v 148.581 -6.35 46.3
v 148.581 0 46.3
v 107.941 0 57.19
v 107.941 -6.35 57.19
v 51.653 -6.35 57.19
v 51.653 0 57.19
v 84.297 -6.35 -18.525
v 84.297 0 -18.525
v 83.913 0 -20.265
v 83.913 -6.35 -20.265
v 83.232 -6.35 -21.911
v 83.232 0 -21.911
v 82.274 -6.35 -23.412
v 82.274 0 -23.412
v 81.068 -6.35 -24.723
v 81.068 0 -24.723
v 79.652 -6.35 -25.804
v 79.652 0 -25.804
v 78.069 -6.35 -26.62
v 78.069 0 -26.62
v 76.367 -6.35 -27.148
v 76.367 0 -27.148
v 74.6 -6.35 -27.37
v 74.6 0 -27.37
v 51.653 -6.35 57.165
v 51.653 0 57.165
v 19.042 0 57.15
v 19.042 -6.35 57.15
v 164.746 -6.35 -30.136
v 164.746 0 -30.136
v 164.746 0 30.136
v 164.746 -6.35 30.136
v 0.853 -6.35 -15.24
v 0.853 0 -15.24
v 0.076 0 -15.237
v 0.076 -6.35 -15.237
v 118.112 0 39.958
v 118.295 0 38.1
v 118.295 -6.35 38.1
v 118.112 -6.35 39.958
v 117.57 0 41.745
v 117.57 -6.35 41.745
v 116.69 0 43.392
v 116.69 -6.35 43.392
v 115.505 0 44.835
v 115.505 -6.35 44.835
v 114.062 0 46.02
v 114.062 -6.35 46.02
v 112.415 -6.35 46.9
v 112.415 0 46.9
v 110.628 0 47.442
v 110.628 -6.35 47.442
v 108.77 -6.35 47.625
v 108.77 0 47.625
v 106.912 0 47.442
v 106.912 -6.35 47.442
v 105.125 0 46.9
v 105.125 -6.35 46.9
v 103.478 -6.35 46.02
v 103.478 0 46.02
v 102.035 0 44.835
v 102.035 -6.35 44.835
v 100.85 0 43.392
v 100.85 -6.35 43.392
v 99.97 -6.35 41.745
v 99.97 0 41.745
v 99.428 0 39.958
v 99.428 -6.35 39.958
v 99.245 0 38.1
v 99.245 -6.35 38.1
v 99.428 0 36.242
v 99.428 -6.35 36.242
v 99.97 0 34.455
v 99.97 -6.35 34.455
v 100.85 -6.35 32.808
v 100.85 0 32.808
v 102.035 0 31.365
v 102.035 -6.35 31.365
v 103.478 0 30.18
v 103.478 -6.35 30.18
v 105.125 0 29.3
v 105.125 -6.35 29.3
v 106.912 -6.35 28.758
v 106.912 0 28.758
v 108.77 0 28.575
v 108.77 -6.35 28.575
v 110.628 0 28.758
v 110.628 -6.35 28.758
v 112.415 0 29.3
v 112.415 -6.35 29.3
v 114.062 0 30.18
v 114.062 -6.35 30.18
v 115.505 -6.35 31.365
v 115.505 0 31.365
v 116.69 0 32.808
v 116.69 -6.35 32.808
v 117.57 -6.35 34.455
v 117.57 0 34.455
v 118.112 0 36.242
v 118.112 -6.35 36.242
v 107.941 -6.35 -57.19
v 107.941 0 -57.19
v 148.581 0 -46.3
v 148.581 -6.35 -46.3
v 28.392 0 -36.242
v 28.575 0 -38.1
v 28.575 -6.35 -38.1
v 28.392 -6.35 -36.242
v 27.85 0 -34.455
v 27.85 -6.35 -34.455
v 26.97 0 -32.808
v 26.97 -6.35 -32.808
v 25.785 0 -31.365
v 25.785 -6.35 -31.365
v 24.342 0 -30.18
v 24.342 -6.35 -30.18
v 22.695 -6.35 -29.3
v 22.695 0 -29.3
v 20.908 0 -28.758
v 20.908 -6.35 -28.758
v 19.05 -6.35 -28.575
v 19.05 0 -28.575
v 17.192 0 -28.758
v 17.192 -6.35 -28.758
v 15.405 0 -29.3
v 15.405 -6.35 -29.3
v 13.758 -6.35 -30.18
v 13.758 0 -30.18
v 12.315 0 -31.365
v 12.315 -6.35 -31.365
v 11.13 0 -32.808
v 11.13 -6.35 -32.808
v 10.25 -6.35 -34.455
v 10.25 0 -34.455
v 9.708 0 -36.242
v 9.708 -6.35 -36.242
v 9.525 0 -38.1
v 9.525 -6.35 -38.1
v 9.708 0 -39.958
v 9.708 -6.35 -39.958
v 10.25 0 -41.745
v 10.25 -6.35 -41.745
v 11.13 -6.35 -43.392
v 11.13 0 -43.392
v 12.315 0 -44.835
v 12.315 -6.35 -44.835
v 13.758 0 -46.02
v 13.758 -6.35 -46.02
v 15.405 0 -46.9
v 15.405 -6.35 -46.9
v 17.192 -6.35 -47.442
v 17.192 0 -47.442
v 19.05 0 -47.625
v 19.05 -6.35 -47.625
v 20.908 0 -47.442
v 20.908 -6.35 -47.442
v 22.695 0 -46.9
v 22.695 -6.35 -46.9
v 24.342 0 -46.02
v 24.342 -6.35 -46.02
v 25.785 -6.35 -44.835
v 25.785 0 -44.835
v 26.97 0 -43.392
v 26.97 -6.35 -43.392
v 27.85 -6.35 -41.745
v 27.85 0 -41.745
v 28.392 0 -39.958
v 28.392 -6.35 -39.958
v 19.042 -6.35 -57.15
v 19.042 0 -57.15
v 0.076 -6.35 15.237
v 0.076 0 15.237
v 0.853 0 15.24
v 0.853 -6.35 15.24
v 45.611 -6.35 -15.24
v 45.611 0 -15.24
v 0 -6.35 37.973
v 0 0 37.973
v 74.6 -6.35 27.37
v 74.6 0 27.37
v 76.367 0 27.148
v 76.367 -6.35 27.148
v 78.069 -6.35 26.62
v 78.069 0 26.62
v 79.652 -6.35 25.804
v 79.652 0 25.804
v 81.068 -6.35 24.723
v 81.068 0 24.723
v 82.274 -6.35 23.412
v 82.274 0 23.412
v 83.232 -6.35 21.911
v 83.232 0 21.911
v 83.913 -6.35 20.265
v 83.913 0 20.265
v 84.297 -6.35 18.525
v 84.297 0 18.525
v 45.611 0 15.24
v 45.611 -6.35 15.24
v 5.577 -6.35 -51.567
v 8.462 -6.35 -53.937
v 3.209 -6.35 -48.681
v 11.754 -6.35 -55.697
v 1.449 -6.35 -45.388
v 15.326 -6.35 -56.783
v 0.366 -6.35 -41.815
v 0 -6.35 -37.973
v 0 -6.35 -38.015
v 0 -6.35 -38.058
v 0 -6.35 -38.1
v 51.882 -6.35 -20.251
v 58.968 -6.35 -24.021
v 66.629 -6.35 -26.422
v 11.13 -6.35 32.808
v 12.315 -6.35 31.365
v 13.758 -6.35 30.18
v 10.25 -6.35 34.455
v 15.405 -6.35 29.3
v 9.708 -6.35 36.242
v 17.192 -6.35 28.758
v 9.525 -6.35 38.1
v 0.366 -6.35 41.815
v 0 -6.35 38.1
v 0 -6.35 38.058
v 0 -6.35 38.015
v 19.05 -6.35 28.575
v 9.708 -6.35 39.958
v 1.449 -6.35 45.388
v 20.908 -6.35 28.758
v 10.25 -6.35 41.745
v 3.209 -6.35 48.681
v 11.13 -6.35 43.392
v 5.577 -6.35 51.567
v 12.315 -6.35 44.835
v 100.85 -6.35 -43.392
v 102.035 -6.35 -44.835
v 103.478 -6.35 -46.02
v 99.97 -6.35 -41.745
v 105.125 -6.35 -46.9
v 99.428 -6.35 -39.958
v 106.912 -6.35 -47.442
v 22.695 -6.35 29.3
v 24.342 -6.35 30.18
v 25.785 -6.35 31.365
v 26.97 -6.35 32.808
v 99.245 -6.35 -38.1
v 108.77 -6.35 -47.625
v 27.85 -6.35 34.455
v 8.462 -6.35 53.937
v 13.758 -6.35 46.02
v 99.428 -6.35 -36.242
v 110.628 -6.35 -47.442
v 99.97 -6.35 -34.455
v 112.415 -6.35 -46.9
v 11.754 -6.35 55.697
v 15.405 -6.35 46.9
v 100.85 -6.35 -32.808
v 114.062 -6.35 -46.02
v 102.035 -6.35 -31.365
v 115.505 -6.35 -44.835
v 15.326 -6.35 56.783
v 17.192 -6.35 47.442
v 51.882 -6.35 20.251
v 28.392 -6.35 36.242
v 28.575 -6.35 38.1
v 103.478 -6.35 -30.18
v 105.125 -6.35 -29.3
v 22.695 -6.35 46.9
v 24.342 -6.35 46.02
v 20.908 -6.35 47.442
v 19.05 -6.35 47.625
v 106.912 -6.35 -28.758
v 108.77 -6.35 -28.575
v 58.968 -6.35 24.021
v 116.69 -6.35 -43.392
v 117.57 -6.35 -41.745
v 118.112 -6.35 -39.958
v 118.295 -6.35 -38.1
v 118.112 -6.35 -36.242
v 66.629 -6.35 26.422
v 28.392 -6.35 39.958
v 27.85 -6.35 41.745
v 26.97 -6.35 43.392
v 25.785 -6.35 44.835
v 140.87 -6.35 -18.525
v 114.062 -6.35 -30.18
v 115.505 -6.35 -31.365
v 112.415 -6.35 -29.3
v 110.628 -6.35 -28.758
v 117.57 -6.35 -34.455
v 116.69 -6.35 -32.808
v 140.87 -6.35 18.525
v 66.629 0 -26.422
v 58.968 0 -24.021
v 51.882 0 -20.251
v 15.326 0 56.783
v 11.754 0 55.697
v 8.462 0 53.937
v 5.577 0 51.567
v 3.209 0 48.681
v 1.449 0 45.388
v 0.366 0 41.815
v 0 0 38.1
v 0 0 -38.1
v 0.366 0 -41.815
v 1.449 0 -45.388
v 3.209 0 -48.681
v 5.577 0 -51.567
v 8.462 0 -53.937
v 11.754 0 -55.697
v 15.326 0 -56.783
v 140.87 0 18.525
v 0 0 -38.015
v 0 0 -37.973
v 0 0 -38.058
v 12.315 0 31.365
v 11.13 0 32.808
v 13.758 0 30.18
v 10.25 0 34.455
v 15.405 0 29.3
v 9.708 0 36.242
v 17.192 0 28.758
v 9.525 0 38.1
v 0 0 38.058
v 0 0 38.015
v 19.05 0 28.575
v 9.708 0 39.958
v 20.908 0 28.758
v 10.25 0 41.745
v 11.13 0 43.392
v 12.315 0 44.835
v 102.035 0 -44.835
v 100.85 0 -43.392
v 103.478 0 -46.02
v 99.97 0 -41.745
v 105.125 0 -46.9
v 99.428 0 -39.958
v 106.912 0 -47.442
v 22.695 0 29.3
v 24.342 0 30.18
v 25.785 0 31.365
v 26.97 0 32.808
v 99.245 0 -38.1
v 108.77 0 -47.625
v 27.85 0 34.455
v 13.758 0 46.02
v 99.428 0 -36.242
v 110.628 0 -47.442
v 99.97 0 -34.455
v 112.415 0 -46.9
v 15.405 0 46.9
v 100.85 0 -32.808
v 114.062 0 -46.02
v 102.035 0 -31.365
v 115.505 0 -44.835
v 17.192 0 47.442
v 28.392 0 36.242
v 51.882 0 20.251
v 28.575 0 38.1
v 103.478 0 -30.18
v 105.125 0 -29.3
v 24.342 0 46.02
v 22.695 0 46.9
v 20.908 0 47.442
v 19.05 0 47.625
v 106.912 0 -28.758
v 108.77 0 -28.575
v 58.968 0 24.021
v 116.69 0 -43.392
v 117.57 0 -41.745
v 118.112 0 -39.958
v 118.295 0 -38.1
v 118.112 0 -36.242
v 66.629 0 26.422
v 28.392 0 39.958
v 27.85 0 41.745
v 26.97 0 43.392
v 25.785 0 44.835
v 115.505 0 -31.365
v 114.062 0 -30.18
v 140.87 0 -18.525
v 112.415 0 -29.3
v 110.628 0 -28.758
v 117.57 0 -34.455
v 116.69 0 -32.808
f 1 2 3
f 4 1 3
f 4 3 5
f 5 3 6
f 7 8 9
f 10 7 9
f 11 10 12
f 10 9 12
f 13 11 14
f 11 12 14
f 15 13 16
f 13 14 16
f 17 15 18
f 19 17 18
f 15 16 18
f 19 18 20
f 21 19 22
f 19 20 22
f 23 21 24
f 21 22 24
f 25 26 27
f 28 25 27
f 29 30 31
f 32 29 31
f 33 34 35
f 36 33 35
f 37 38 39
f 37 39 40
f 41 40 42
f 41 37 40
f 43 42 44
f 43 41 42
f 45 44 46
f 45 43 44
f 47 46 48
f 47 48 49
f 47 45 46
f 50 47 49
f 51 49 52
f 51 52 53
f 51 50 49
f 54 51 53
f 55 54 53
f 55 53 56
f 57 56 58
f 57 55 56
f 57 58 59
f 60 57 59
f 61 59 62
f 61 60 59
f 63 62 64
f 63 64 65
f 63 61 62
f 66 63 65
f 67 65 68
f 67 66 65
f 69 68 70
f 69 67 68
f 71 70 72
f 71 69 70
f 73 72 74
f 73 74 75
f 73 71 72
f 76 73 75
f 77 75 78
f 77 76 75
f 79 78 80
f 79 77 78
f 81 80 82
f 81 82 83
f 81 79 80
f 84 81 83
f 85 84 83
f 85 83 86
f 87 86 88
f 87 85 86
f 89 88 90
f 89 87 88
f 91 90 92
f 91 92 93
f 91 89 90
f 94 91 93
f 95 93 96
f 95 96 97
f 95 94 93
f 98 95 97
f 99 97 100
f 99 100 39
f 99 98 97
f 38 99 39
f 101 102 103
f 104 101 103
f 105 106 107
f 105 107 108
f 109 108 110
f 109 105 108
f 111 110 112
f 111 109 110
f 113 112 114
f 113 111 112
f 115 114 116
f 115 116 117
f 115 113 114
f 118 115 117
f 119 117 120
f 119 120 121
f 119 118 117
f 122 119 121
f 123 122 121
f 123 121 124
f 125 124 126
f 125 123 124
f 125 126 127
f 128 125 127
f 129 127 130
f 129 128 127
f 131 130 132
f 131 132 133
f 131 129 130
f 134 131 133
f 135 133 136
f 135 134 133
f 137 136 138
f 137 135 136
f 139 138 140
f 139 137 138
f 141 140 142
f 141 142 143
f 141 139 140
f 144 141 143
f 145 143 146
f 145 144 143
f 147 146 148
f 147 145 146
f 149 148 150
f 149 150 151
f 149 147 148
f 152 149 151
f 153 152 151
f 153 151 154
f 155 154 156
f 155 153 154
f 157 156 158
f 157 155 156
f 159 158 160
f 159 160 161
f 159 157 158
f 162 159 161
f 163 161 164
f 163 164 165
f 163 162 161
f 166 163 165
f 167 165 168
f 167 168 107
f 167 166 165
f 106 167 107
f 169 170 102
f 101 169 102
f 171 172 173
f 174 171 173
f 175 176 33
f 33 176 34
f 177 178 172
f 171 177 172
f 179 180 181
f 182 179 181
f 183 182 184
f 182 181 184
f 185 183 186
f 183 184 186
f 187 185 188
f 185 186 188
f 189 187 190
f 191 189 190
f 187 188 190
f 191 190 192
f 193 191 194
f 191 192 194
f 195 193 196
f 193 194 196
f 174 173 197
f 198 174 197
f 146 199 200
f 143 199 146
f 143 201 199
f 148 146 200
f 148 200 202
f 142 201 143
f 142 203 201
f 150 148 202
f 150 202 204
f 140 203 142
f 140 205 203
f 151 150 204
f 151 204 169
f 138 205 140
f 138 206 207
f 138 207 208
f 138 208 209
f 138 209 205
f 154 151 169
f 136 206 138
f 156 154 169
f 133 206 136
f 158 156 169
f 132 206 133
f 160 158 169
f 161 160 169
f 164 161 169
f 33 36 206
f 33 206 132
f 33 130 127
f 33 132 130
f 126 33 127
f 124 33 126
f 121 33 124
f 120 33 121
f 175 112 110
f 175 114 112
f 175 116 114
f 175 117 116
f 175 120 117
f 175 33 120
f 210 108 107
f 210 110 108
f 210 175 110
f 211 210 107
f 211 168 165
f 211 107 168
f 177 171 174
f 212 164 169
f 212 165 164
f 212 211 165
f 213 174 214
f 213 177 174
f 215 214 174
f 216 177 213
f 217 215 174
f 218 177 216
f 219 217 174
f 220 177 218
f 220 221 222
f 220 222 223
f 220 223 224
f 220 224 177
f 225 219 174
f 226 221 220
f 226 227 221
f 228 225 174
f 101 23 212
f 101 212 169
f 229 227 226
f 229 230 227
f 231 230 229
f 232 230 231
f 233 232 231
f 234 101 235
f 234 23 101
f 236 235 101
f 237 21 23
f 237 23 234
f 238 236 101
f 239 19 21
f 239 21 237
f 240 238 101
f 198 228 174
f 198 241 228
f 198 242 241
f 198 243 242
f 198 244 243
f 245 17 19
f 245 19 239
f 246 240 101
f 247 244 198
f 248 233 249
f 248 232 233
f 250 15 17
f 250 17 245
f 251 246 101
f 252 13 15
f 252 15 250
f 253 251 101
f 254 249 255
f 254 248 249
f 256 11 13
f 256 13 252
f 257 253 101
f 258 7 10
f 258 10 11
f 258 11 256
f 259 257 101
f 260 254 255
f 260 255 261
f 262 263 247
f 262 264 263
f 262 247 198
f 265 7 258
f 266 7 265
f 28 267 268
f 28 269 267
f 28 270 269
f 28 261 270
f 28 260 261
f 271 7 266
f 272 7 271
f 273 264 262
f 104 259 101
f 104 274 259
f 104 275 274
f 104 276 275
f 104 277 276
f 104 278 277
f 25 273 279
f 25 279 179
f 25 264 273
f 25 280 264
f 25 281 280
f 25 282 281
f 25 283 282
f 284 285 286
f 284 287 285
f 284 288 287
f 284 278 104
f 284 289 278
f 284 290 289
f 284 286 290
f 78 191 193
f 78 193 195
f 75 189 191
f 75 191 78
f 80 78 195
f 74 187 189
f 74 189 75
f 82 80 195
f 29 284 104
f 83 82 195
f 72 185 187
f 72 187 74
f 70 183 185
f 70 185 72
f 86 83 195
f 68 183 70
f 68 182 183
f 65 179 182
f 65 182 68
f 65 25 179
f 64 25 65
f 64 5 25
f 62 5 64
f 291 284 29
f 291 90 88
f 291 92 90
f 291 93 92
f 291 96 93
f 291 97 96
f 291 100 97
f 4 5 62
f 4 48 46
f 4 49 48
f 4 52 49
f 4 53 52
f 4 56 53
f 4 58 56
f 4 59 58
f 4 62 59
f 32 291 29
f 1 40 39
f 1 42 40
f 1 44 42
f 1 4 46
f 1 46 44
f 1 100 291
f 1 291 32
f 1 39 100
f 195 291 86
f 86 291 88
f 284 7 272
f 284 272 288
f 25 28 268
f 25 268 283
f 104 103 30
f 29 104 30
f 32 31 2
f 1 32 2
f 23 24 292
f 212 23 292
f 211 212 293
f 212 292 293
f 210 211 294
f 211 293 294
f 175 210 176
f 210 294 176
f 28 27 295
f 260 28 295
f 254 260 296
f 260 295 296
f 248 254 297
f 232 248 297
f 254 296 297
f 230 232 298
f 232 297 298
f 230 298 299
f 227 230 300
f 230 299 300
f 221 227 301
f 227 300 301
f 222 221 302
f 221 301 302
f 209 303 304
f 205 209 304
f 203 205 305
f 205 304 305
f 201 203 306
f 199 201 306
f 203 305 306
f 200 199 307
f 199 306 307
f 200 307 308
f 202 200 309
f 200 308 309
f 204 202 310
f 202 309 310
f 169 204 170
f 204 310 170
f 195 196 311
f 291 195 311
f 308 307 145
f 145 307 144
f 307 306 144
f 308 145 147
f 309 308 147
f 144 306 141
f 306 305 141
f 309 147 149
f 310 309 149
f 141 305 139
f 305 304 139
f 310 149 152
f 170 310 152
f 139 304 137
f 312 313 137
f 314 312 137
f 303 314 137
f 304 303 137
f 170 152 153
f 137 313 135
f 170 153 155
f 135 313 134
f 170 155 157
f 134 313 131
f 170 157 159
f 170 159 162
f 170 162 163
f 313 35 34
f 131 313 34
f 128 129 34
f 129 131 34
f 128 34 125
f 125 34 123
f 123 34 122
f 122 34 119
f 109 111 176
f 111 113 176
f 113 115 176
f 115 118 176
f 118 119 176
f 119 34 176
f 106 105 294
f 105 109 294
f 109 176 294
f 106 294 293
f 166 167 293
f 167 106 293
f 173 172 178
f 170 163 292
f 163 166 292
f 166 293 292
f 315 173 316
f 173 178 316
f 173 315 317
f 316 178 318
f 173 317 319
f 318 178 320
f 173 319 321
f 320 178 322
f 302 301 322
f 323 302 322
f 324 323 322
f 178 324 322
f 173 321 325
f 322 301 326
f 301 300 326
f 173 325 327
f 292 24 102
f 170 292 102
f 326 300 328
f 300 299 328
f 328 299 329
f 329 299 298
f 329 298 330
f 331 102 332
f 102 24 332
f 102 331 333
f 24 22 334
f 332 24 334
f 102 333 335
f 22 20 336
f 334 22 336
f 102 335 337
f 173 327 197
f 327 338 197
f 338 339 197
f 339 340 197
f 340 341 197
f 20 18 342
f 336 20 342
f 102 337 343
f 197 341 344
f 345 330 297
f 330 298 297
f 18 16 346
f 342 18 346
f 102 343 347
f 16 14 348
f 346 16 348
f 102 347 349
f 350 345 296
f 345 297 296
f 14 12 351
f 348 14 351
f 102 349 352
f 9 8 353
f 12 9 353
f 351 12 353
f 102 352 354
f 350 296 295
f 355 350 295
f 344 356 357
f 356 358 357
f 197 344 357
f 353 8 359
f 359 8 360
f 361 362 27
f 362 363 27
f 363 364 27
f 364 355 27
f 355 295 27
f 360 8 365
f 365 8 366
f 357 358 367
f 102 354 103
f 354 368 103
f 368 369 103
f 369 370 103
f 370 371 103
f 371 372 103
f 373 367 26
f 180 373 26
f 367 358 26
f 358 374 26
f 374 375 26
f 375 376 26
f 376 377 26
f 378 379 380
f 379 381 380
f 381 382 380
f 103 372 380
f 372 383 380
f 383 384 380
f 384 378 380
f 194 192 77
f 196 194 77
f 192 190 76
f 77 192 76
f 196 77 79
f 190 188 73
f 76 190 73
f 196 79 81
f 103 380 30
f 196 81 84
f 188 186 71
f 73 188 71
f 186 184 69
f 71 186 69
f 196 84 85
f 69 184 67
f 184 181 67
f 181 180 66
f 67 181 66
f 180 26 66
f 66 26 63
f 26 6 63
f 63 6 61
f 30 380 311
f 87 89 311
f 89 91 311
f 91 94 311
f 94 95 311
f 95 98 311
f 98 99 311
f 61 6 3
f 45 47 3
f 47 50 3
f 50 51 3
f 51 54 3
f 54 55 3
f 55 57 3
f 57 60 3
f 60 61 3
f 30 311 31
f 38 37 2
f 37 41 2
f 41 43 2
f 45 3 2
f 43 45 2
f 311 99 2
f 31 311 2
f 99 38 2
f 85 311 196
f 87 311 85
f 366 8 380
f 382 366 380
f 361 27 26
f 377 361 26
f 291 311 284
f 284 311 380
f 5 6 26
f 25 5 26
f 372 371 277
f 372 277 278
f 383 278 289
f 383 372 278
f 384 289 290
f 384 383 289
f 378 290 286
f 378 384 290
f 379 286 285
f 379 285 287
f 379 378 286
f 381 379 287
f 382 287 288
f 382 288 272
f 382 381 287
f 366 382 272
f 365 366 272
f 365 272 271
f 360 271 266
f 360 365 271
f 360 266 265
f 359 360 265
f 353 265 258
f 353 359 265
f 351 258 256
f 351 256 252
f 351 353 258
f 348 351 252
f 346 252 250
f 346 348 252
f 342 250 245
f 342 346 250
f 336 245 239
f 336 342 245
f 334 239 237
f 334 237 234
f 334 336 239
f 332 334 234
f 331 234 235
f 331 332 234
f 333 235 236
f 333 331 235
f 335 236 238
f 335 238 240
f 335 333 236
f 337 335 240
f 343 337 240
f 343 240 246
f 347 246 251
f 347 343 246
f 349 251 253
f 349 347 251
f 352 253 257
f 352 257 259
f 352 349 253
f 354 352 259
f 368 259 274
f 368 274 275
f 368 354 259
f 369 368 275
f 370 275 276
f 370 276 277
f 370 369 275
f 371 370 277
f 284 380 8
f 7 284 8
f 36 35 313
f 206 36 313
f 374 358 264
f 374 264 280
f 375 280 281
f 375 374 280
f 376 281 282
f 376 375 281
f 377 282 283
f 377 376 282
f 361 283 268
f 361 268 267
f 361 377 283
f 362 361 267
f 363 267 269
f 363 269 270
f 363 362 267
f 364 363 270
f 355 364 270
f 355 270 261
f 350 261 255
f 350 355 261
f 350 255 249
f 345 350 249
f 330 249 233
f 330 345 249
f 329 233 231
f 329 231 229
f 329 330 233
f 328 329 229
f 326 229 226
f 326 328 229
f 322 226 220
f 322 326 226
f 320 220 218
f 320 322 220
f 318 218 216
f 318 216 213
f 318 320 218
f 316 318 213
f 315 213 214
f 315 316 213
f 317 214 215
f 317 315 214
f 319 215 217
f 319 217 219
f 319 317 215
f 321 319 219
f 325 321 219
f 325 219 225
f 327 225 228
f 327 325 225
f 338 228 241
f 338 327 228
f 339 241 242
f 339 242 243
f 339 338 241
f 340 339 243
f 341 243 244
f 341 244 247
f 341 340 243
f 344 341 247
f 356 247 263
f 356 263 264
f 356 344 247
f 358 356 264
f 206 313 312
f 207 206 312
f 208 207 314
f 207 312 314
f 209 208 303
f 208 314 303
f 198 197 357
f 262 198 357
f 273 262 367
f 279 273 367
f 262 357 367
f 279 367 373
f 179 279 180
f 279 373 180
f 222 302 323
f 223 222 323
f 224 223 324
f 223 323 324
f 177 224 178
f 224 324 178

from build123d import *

# Parameters (mm, degrees)
F0_R     = 9.525
F1_DEPTH = 6.35


with BuildPart() as f1:
    # F0 (on Front) → F1 (new body)
    with BuildSketch(Plane.XZ):
        with BuildLine():
            Line((0.076142, 15.237411), (0.853466, 15.24))
            Line((0.853466, 15.24), (45.610599, 15.24))
            ThreePointArc((45.610599, 15.24), (58.968483, 24.02141), (74.599698, 27.369742))
            ThreePointArc((74.599698, 27.369742), (81.067987, 24.723293), (84.296649, 18.525051))
            Line((84.296649, 18.525051), (140.869953, 18.525051))
            Line((140.869953, 18.525051), (140.869953, 1.794949))
            Line((140.869953, 1.794949), (140.869953, -1.794949))
            Line((140.869953, -1.794949), (140.869953, -18.525051))
            Line((140.869953, -18.525051), (84.296649, -18.525051))
            ThreePointArc((84.296649, -18.525051), (81.067987, -24.723293), (74.599698, -27.369742))
            ThreePointArc((74.599698, -27.369742), (58.968483, -24.02141), (45.610599, -15.24))
            Line((45.610599, -15.24), (0.853466, -15.24))
            Line((0.853466, -15.24), (0.076142, -15.237411))
            Line((0.076142, -15.237411), (0.000423, -37.973113))
            ThreePointArc((0.000423, -37.973113), (0.000106, -38.036556), (0, -38.1))
            ThreePointArc((0, -38.1), (5.576611, -51.567379), (19.041501, -57.149998))
            Line((19.041501, -57.149998), (107.941492, -57.189659))
            Line((107.941492, -57.189659), (148.581492, -46.300204))
            Line((148.581492, -46.300204), (164.745953, -30.135743))
            Line((164.745953, -30.135743), (164.745953, 1.837931))
            Line((164.745953, 1.837931), (164.745953, 30.135743))
            Line((164.745953, 30.135743), (148.581492, 46.300204))
            Line((148.581492, 46.300204), (107.941492, 57.189659))
            Line((107.941492, 57.189659), (51.653466, 57.164547))
            Line((51.653466, 57.164547), (19.041501, 57.149998))
            ThreePointArc((19.041501, 57.149998), (5.576611, 51.567379), (0, 38.1))
            ThreePointArc((0, 38.1), (0.000106, 38.036556), (0.000423, 37.973113))
            Line((0.000423, 37.973113), (0.076142, 15.237411))
        make_face()
        with Locations((19.05, -38.1)):
            Circle(F0_R, mode=Mode.SUBTRACT)
        with Locations((108.77014, -38.1)):
            Circle(F0_R, mode=Mode.SUBTRACT)
        with Locations((19.05, 38.1)):
            Circle(F0_R, mode=Mode.SUBTRACT)
        with Locations((108.77014, 38.1)):
            Circle(F0_R, mode=Mode.SUBTRACT)
        Polygon((51.653466, 57.189659), (51.653466, 57.164547), (107.941492, 57.189659), align=None)
    extrude(amount=F1_DEPTH)


solid = f1.part
